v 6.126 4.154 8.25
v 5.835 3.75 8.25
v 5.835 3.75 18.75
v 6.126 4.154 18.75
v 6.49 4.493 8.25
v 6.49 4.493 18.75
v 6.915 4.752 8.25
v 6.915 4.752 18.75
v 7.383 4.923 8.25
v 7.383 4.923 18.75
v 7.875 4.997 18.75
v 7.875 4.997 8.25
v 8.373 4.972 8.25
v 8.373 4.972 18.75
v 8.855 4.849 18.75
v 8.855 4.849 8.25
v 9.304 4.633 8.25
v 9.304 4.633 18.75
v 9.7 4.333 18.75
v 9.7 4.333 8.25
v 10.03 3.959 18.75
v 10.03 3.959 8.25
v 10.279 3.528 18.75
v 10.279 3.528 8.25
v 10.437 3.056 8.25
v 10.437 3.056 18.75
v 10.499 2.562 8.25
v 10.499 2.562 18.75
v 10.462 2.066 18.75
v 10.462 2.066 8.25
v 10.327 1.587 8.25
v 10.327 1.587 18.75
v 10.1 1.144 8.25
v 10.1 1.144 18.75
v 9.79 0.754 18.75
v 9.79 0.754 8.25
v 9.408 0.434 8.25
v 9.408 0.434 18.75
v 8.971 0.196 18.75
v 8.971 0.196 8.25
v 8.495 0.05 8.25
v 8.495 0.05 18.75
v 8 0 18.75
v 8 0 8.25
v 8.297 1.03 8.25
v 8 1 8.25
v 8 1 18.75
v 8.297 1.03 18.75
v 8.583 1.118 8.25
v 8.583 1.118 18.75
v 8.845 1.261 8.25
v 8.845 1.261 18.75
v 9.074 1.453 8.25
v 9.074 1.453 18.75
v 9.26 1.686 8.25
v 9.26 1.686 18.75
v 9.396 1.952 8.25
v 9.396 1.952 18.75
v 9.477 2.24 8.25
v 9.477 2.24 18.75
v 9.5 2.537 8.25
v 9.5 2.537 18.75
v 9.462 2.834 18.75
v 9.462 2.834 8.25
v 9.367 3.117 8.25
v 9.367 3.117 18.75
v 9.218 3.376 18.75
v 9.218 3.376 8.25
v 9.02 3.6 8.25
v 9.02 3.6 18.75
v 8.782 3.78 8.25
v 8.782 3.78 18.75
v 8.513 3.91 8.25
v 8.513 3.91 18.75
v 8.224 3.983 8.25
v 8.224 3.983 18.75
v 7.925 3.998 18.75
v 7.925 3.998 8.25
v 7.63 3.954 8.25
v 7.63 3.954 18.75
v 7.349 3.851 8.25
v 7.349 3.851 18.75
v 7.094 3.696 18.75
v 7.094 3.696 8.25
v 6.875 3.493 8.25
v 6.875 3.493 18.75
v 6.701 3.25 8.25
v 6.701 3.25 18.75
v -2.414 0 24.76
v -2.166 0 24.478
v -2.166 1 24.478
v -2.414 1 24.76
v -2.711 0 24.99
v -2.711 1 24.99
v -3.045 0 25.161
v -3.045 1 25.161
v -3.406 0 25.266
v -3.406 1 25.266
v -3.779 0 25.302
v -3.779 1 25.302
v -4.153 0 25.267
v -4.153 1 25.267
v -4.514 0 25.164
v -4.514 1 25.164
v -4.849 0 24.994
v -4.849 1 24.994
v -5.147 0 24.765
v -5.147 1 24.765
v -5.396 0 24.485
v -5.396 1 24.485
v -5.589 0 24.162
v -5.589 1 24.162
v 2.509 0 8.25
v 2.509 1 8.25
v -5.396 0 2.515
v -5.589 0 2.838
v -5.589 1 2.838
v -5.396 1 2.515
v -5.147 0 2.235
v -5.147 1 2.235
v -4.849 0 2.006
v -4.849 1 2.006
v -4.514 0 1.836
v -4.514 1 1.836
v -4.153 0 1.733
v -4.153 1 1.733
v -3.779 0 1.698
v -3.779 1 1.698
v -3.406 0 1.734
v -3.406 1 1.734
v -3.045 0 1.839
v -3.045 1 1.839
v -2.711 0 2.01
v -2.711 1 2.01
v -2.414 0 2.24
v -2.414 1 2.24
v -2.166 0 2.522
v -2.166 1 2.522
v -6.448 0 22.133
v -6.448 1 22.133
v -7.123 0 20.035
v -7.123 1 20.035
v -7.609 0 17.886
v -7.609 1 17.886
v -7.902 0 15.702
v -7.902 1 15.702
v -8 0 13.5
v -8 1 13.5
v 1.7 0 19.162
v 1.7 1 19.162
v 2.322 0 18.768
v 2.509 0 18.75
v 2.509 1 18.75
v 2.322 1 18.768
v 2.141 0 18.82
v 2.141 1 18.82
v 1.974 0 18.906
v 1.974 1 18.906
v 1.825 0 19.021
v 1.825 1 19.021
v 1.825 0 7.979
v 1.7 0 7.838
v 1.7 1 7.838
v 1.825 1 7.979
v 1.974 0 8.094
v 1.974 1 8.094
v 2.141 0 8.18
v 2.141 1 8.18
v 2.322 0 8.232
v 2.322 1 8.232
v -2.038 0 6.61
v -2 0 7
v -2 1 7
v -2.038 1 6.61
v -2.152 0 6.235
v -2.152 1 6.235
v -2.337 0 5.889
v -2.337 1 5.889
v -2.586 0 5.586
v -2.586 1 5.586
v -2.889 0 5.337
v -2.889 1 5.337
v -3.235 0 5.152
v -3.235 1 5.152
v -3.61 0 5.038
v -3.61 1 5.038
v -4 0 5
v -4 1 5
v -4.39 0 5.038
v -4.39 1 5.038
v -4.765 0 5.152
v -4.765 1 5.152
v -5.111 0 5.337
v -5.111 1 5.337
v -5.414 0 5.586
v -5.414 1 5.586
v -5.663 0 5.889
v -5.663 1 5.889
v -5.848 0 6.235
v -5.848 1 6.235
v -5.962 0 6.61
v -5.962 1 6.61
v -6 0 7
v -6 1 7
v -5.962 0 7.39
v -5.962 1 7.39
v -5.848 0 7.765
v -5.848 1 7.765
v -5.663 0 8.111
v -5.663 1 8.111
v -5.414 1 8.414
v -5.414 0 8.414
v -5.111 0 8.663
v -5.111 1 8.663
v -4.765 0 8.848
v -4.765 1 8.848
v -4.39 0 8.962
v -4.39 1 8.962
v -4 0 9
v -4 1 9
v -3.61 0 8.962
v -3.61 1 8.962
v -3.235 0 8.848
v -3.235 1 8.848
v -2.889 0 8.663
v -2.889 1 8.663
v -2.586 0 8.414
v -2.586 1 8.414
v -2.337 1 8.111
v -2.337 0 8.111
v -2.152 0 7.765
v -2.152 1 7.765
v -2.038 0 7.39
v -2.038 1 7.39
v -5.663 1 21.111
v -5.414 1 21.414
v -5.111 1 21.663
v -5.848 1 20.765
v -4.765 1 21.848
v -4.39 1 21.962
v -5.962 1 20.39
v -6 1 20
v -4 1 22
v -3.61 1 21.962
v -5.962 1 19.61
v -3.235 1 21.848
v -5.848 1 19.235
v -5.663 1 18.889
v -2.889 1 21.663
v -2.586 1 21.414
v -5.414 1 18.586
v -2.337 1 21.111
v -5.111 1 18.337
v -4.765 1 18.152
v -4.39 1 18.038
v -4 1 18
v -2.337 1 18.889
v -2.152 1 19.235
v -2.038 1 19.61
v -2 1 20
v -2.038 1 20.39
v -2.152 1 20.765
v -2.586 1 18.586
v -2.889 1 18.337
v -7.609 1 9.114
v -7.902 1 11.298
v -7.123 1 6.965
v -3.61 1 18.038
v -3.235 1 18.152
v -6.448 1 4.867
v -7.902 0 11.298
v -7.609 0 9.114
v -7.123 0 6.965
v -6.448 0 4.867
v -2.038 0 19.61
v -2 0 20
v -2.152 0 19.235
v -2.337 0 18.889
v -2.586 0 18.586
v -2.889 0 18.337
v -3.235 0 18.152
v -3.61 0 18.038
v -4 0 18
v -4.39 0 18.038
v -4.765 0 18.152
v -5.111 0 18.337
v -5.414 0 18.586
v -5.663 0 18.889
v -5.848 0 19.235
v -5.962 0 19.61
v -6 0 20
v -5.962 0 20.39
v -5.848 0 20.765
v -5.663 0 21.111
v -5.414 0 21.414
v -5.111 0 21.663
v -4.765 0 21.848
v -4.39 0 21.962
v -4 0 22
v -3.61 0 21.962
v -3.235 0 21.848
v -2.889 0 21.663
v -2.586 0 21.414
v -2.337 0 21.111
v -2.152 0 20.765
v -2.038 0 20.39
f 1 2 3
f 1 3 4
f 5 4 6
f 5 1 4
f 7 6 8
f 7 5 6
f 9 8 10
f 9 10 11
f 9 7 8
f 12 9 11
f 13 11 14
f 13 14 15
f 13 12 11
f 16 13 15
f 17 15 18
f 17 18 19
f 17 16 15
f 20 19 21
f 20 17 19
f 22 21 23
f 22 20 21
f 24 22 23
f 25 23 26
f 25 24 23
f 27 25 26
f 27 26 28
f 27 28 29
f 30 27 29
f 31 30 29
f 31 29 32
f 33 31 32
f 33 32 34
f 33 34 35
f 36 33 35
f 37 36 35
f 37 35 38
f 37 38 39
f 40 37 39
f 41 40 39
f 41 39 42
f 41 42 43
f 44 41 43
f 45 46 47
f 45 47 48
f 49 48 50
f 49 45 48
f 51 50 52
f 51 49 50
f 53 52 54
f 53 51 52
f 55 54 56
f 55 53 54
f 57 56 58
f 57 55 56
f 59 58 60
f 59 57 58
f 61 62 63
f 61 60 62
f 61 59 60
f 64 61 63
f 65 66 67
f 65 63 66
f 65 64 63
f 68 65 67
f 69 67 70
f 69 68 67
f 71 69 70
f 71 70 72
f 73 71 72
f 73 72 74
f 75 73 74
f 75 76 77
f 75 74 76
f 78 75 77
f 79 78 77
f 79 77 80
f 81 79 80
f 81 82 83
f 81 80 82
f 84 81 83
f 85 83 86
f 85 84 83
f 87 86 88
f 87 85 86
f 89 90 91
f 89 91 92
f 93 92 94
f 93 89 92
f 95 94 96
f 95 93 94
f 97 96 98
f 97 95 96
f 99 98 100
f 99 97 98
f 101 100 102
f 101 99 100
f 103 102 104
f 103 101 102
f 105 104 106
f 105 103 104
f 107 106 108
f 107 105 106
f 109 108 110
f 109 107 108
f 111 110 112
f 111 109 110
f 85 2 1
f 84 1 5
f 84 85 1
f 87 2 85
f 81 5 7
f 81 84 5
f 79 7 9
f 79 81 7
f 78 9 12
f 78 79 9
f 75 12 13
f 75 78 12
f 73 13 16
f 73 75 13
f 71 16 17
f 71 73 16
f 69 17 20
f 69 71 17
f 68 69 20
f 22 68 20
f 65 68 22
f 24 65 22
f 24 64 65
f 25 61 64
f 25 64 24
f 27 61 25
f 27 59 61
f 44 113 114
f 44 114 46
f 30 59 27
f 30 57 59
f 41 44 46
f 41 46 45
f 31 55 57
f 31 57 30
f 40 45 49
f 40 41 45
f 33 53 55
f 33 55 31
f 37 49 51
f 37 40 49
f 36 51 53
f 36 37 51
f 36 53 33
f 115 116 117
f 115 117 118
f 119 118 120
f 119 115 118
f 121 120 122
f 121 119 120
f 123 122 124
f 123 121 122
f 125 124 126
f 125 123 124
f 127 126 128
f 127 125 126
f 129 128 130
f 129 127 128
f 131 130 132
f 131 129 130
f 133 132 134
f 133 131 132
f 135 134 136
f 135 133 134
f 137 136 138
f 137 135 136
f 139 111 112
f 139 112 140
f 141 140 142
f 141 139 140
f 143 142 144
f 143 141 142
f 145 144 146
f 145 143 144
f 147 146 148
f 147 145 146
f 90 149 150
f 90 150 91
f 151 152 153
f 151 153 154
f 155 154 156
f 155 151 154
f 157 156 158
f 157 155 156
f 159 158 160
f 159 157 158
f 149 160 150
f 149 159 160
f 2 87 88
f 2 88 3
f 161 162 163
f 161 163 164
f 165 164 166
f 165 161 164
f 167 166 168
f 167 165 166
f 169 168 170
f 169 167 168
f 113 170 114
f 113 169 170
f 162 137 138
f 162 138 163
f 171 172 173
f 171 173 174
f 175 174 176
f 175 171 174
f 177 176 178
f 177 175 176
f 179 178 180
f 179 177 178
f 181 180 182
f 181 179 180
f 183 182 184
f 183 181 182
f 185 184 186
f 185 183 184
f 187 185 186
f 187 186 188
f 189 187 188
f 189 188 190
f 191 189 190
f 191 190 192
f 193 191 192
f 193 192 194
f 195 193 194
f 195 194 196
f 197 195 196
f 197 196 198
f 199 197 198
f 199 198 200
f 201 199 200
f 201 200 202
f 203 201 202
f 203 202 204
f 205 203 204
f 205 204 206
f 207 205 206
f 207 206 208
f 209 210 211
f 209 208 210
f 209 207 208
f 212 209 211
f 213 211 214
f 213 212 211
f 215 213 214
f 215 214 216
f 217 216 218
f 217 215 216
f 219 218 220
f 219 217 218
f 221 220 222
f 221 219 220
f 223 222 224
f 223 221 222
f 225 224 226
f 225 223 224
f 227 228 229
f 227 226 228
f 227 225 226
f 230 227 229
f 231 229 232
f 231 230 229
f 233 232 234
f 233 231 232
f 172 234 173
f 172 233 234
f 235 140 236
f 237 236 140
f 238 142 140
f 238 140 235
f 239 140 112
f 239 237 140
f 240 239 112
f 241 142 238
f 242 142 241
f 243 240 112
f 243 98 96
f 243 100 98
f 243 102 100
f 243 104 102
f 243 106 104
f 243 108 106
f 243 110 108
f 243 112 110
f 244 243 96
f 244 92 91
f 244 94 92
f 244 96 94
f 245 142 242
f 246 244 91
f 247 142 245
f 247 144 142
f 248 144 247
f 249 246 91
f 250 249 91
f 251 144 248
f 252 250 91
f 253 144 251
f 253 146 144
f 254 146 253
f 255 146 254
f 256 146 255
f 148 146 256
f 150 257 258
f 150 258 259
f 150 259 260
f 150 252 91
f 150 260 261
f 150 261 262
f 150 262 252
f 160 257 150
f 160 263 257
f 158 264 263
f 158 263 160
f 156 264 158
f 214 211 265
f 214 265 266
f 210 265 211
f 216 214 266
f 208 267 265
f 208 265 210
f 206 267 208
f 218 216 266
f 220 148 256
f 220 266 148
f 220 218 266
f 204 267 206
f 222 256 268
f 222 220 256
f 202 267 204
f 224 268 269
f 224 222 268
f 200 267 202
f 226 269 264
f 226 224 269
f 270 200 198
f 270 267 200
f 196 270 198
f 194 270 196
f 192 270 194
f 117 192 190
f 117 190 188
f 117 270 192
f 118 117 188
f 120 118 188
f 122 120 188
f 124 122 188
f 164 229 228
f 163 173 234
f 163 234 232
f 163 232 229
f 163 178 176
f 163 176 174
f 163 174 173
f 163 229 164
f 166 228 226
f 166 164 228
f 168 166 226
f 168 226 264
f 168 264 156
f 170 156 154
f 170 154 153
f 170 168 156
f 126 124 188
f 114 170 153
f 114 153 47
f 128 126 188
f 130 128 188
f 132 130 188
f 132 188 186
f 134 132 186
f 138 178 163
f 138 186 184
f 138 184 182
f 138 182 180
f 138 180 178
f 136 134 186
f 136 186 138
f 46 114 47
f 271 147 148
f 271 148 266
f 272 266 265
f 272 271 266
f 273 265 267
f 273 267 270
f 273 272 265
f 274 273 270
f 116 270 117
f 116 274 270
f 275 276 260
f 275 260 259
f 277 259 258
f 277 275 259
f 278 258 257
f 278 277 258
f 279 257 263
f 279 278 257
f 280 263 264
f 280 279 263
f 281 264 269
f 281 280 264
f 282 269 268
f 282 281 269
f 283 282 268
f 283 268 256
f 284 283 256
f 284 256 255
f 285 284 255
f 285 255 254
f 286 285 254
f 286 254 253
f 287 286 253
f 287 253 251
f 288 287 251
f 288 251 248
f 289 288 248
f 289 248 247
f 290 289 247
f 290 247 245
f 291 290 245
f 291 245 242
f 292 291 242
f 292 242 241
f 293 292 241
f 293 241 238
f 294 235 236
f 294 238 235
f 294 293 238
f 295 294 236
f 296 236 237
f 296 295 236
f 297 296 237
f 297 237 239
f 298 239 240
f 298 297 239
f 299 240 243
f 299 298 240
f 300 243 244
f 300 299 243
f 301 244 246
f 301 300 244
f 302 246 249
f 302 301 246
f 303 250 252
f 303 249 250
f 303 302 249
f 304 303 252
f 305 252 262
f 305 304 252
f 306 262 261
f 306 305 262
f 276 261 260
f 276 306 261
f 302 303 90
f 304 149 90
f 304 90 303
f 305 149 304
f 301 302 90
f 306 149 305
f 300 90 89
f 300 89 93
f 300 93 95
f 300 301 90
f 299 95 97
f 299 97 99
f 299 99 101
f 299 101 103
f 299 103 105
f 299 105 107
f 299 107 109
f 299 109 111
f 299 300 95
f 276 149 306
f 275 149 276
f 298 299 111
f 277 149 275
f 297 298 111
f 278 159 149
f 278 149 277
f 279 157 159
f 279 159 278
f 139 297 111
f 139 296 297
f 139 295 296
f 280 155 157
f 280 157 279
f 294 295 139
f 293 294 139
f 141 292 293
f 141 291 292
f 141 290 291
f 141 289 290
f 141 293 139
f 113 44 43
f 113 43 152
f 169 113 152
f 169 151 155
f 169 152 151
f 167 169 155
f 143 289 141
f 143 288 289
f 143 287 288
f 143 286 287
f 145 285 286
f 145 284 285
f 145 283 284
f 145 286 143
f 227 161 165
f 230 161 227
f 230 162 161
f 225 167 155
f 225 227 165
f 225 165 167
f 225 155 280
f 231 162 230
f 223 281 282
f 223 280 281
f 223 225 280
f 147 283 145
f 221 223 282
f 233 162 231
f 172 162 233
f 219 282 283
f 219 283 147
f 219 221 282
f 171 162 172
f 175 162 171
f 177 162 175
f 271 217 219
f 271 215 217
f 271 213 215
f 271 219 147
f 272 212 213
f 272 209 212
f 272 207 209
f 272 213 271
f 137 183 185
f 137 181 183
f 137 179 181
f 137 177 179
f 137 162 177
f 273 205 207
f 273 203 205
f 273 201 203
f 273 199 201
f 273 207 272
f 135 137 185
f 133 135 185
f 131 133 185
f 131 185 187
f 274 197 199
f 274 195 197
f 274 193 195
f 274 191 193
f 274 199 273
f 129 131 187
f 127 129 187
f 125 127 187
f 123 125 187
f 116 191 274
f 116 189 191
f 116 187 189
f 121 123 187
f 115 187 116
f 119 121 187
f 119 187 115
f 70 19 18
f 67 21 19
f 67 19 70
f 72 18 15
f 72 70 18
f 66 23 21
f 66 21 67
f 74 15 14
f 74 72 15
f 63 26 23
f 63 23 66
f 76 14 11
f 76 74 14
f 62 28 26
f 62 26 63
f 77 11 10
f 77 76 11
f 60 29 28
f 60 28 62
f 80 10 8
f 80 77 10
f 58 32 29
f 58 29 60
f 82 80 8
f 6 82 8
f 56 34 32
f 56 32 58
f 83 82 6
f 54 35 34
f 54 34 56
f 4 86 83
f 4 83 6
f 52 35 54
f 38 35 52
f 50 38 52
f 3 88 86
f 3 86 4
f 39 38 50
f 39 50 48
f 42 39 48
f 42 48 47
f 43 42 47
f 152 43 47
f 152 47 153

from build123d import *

# Parameters (mm, degrees)
ESTRUSIONE_ESTRUSIONE1_DEPTH  = 27
TAGLIO_ESTRUSIONE1_DEPTH      = 27
TAGLIO_ESTRUSIONE1_DEPTH_BACK = 27
SCHIZZO2_R                    = 2


with BuildPart() as part:
    # Schizzo1 → Estrusione-Estrusione1 (new body)
    with BuildSketch(Plane.XY):
        with BuildLine():
            Line((-8, 1), (8, 1))
            ThreePointArc((8, 1), (9.299038106, 3.25), (6.700961894, 3.25))
            Line((6.700961894, 3.25), (5.834936491, 3.75))
            ThreePointArc((5.834936491, 3.75), (10.165063509, 3.75), (8, 0))
            Line((8, 0), (-8, 0))
            Line((-8, 0), (-8, 1))
        make_face()
    extrude(amount=ESTRUSIONE_ESTRUSIONE1_DEPTH)

    # Schizzo2 → Taglio-Estrusione1 (cut, two sides: drawn at the far end of the back side and taken through both)
    with BuildSketch(Plane(origin=(0, 1, 0), x_dir=(1, 0, 0), z_dir=(0, 1, 0)).offset(-TAGLIO_ESTRUSIONE1_DEPTH_BACK)):
        with BuildLine():
            Line((12, -8.25), (12, 0))
            Line((12, 0), (-8, 0))
            Line((-8, 0), (-8, -13.5))
            ThreePointArc((-8, -13.5), (-7.389705753, -8.034174396), (-5.588882762, -2.837565391))
            ThreePointArc((-5.588882762, -2.837565391), (-3.967228406, -1.706548983), (-2.166002653, -2.521746353))
            Line((-2.166002653, -2.521746353), (1.700488507, -7.838171698))
            ThreePointArc((1.700488507, -7.838171698), (2.055446947, -8.141114947), (2.509224592, -8.25))
            Line((2.509224592, -8.25), (12, -8.25))
        make_face()
        with BuildLine():
            Line((-8, -27), (12, -27))
            Line((12, -27), (12, -18.75))
            Line((12, -18.75), (2.509224592, -18.75))
            ThreePointArc((2.509224592, -18.75), (2.055446947, -18.858885053), (1.700488507, -19.161828302))
            Line((1.700488507, -19.161828302), (-2.166002653, -24.478253647))
            ThreePointArc((-2.166002653, -24.478253647), (-3.967228406, -25.293451017), (-5.588882762, -24.162434609))
            ThreePointArc((-5.588882762, -24.162434609), (-7.389705753, -18.965825604), (-8, -13.5))
            Line((-8, -13.5), (-8, -27))
        make_face()
        with Locations((-4, -7)):
            Circle(SCHIZZO2_R)
        with Locations((-4, -20)):
            Circle(SCHIZZO2_R)
    extrude(amount=TAGLIO_ESTRUSIONE1_DEPTH + TAGLIO_ESTRUSIONE1_DEPTH_BACK, mode=Mode.SUBTRACT)


solid = part.part
